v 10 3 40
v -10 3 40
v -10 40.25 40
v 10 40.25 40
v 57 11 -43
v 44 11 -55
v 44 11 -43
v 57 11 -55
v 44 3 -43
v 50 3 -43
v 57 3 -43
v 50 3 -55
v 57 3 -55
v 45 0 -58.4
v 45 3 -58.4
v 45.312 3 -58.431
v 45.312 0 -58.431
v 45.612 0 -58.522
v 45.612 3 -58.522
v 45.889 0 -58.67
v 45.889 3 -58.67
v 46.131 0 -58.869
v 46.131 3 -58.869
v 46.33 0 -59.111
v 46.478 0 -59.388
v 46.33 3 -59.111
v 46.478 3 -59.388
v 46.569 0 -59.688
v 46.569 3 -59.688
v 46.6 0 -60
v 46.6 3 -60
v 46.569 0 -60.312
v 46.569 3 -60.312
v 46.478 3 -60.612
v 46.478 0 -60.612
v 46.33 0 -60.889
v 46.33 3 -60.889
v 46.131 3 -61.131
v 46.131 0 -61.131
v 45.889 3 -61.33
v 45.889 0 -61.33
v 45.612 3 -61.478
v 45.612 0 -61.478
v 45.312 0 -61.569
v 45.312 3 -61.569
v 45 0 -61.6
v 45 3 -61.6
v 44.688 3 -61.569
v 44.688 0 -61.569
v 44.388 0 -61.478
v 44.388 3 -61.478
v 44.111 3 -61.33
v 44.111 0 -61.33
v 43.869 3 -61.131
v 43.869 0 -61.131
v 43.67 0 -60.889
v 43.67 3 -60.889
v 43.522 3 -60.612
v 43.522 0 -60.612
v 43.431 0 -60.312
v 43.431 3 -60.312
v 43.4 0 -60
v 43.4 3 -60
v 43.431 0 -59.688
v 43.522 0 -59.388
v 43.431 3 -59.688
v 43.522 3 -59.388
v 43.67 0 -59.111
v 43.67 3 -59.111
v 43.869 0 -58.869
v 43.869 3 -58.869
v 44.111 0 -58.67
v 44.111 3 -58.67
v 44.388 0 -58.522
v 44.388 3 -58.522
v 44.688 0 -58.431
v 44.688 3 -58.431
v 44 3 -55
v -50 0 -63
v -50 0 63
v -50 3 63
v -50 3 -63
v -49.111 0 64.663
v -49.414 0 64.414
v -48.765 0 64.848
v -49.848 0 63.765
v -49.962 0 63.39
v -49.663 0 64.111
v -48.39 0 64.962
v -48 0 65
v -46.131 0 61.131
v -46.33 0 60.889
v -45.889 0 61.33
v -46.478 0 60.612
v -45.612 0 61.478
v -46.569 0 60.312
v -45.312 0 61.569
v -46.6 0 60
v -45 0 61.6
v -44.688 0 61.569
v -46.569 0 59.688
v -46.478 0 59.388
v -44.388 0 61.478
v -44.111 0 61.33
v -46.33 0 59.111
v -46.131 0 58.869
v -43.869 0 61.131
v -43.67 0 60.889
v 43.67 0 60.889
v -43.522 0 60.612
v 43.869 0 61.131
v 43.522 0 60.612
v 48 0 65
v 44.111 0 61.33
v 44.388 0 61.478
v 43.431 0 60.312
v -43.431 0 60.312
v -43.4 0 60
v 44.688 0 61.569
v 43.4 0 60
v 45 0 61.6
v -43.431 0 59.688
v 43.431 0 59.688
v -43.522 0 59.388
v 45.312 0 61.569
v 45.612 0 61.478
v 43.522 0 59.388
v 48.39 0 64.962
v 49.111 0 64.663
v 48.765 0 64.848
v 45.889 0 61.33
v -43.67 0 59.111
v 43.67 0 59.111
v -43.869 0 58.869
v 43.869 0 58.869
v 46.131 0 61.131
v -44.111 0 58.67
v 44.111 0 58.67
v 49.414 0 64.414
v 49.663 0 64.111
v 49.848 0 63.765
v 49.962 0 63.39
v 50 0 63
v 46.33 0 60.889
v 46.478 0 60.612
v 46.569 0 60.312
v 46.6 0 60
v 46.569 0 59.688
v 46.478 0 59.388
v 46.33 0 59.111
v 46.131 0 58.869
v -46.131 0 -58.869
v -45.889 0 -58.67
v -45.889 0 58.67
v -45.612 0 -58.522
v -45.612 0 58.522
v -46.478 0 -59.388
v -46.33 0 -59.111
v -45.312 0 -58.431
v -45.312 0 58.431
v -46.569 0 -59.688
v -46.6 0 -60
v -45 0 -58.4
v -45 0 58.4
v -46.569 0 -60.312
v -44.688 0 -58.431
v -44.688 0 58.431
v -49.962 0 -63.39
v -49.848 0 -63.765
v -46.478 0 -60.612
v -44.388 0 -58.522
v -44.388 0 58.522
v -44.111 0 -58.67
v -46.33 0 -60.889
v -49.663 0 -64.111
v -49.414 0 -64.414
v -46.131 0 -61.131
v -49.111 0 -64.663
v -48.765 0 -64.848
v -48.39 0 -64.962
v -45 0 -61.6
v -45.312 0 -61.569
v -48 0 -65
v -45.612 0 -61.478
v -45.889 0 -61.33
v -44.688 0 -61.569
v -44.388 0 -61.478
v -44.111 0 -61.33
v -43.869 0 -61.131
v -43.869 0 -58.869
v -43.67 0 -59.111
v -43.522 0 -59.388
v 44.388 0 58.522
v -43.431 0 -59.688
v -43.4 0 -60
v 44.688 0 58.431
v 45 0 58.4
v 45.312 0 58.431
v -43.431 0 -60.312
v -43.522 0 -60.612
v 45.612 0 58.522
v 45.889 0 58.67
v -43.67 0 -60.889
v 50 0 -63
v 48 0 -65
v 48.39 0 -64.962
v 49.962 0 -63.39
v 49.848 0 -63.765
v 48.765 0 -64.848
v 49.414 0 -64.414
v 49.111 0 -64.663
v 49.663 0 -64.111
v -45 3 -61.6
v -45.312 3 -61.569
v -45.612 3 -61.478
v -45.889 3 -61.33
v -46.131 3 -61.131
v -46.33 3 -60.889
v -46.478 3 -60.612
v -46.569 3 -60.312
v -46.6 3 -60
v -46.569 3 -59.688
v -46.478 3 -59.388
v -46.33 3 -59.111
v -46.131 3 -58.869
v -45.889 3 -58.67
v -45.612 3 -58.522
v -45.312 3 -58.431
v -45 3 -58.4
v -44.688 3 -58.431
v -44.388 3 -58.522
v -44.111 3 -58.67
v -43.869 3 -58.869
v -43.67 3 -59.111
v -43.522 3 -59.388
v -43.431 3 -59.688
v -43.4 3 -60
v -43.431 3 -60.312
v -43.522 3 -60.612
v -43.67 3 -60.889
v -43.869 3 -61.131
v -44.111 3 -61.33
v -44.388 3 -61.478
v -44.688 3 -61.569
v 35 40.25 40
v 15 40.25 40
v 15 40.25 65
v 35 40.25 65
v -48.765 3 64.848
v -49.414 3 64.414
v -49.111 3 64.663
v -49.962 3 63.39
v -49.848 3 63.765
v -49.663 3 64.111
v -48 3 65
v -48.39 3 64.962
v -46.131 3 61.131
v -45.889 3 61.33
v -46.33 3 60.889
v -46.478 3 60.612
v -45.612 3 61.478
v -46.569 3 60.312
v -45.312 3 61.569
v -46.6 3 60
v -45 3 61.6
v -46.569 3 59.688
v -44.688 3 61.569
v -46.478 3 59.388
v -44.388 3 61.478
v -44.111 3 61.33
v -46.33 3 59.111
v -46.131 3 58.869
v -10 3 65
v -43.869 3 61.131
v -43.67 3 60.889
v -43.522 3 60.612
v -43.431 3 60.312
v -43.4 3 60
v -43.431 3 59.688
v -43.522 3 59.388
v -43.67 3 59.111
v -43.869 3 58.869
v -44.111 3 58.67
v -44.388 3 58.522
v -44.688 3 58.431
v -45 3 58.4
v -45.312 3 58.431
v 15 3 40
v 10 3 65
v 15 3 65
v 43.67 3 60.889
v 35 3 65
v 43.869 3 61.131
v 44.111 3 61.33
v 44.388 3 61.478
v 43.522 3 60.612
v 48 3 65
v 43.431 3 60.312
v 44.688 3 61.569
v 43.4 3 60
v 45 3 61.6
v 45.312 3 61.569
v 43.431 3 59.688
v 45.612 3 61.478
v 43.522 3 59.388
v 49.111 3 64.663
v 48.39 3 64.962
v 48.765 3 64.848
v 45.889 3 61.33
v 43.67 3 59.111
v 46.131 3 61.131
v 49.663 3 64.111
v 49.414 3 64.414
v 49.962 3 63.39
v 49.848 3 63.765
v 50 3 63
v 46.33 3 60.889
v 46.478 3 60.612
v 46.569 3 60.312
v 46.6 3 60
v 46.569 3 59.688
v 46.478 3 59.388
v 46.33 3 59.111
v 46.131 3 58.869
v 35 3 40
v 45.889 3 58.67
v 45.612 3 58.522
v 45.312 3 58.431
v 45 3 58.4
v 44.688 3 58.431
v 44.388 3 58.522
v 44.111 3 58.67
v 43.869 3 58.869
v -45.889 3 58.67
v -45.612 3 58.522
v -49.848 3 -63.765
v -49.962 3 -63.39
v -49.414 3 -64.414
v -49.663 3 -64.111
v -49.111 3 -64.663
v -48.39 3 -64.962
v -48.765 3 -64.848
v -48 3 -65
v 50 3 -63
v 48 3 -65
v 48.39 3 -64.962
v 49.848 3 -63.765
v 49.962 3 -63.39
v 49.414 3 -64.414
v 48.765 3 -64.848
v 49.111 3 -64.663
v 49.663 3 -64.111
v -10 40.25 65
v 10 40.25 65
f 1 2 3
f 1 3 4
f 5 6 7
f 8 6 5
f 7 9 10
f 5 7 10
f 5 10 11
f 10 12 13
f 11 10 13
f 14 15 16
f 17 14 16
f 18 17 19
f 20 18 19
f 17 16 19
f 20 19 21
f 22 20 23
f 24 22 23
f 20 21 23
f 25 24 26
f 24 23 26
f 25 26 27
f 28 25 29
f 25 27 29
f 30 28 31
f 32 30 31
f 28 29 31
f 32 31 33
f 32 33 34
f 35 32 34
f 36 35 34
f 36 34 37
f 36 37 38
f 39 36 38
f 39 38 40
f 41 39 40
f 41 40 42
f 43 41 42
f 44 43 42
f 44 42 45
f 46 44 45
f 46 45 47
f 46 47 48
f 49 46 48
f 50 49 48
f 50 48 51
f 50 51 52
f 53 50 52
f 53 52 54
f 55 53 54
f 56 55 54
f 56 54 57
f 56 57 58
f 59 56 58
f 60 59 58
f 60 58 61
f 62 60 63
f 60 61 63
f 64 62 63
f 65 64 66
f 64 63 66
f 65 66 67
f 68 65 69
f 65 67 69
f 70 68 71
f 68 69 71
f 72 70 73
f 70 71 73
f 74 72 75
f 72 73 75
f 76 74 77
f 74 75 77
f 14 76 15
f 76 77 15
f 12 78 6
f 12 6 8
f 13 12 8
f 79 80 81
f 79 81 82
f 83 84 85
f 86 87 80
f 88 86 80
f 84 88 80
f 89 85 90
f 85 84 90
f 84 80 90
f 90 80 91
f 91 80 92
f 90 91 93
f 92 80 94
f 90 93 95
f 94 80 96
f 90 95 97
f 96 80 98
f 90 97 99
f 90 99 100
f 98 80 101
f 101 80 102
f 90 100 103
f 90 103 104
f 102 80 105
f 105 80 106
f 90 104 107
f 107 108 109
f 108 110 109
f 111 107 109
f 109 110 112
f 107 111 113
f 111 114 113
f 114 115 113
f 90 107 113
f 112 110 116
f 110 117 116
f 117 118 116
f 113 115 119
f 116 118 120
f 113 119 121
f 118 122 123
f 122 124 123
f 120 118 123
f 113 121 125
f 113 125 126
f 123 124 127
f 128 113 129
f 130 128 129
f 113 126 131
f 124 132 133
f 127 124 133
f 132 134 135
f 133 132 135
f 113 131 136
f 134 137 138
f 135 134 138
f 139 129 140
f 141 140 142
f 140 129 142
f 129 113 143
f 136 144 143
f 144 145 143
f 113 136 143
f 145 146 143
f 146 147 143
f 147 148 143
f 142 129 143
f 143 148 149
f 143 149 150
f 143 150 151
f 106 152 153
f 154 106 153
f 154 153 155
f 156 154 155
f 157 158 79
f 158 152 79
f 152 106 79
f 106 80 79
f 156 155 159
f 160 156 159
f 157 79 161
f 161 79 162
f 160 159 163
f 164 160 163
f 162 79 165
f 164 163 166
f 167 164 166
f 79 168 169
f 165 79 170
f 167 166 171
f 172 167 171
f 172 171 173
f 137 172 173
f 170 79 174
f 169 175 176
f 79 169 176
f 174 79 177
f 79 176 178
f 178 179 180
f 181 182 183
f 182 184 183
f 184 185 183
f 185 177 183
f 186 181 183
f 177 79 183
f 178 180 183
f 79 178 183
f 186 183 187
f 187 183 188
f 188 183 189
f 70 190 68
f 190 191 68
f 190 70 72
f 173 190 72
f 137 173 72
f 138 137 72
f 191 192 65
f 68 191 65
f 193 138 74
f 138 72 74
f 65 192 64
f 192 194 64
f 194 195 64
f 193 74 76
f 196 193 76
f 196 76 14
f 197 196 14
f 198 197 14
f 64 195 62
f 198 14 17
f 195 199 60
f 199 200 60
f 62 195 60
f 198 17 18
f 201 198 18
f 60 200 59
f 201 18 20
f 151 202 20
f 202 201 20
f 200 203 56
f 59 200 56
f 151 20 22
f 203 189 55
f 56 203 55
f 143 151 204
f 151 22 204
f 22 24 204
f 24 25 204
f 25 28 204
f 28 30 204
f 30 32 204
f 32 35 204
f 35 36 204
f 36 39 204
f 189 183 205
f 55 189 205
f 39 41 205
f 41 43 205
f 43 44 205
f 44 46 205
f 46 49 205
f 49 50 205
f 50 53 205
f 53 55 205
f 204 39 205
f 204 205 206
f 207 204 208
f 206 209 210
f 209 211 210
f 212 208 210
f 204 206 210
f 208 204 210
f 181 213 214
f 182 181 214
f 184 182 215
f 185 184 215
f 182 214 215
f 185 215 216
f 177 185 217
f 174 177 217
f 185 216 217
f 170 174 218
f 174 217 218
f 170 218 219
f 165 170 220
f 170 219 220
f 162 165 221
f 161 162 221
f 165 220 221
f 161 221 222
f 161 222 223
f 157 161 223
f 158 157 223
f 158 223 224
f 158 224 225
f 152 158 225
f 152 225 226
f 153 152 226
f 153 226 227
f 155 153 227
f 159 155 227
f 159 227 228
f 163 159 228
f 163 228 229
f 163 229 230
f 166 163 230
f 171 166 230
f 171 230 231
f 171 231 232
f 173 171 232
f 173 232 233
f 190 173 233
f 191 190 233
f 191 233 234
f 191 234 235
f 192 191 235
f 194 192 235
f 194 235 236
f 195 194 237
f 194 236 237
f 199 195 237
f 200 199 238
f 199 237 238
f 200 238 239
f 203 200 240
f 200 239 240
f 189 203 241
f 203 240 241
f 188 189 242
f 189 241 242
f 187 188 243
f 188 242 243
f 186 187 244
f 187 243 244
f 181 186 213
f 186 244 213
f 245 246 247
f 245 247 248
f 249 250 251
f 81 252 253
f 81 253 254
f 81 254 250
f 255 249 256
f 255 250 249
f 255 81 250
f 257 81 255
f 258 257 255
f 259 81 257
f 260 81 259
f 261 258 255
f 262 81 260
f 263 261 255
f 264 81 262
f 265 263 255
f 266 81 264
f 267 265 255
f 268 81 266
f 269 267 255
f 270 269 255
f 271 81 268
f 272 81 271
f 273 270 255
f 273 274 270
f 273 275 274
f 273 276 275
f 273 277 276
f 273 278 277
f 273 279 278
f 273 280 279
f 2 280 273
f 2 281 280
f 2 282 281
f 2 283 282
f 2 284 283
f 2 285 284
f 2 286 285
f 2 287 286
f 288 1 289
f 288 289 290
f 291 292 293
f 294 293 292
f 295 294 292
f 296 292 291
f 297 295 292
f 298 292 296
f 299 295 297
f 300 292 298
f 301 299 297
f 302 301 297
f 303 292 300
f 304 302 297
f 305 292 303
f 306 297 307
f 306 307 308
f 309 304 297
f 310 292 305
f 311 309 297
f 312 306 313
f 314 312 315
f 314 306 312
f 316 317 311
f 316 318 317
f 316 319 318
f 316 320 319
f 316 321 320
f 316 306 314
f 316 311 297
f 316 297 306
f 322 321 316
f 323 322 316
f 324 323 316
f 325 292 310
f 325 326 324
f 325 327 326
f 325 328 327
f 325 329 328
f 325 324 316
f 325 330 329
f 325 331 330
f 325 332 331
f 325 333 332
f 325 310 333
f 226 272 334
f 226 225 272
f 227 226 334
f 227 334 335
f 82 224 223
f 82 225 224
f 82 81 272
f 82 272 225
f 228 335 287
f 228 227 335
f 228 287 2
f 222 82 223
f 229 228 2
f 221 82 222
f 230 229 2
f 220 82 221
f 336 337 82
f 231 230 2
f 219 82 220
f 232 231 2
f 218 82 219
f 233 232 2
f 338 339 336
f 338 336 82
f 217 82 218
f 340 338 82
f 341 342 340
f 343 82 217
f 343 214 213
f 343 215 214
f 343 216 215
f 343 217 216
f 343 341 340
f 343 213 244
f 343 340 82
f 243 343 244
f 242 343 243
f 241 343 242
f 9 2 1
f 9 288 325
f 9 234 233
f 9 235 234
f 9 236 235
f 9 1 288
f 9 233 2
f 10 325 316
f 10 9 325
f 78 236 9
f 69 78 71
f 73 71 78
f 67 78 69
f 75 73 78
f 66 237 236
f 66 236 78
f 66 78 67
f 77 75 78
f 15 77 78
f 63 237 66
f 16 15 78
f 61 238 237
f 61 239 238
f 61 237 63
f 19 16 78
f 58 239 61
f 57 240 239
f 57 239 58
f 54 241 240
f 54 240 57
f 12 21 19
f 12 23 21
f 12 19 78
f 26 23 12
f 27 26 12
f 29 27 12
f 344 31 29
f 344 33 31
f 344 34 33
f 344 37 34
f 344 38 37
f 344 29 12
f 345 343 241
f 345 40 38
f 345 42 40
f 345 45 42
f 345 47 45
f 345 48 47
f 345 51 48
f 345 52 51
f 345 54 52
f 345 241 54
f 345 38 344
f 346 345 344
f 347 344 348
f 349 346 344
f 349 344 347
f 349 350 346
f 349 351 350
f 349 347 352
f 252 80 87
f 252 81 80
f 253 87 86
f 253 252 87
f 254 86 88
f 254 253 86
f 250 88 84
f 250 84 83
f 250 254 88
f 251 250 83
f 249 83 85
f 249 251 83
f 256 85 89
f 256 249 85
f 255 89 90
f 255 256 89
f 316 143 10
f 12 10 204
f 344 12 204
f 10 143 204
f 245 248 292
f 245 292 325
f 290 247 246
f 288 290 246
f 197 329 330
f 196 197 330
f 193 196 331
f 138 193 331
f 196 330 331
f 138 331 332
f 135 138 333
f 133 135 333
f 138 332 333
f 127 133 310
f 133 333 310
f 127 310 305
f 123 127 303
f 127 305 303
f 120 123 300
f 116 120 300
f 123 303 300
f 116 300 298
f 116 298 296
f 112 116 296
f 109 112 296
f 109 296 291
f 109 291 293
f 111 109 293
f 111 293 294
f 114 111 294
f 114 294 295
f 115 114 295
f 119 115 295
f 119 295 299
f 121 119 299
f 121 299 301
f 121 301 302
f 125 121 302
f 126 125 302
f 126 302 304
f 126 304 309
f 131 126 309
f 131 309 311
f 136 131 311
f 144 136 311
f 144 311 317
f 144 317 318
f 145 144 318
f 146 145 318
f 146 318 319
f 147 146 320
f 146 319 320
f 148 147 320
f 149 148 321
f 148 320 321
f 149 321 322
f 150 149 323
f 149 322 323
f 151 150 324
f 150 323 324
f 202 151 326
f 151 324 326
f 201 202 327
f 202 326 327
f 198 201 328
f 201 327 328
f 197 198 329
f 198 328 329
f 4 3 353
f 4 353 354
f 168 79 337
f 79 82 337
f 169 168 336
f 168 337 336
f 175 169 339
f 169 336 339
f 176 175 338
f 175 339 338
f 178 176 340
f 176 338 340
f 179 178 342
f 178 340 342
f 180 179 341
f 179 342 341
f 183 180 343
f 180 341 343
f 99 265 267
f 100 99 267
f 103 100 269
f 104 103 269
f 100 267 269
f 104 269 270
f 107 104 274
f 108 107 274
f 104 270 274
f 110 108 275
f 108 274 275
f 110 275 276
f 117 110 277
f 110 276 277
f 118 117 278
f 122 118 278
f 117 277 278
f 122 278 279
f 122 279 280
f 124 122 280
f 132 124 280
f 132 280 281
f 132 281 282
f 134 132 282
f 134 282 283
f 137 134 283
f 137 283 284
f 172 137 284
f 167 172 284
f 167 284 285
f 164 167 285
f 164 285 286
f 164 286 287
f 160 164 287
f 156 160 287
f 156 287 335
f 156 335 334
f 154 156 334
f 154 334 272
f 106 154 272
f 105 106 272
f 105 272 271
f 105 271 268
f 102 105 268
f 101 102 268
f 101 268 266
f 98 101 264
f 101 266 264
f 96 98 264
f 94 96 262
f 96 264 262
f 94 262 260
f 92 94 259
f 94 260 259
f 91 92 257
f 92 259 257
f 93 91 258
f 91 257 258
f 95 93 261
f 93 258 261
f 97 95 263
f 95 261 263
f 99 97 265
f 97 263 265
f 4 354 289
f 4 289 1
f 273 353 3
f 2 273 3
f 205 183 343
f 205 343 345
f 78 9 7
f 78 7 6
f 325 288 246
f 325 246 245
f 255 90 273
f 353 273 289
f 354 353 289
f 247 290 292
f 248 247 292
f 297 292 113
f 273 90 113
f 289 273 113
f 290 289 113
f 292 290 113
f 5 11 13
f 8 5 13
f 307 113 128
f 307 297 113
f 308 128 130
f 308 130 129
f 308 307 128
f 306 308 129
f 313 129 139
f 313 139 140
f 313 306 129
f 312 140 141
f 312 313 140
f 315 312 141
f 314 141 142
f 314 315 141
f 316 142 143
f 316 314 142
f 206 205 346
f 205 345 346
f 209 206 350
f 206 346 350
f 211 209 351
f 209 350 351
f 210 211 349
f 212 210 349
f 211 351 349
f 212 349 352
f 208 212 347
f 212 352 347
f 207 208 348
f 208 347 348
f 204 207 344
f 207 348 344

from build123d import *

# Parameters (mm, degrees)
SKETCH_1_W          = 100
SKETCH_1_H          = 130
EXTRUDE_1_DEPTH     = 3
SKETCH_2_W          = 20
SKETCH_2_H          = 25
EXTRUDE_2_DEPTH     = 37.25
FILLET_1_R          = 2
SKETCH_3_W          = 13
SKETCH_3_H          = 12
EXTRUDE_3_DEPTH     = 8
SKETCH_4_R          = 1.6
CUT_EXTRUDE_1_DEPTH = 95.135872546


with BuildPart() as part:
    # 草图1 → 凸台-拉伸1 (new body)
    with BuildSketch(Plane(origin=(0, 0, 0), x_dir=(1, 0, 0), z_dir=(0, 1, 0))):
        Rectangle(SKETCH_1_W, SKETCH_1_H)
    extrude(amount=EXTRUDE_1_DEPTH)

    # 草图2 → 凸台-拉伸2 (add)
    with BuildSketch(Plane(origin=(0, 3, 0), x_dir=(1, 0, 0), z_dir=(0, 1, 0))):
        with Locations((0, -52.5)):
            Rectangle(SKETCH_2_W, SKETCH_2_H)
        with Locations((25, -52.5)):
            Rectangle(SKETCH_2_W, SKETCH_2_H)
    extrude(amount=EXTRUDE_2_DEPTH)

    # 圆角1
    fillet_1_edges = [part.edges().sort_by_distance(p)[0] for p in [
        (-50, 1.5, 65),
        (-50, 1.5, -65),
        (50, 1.5, -65),
        (50, 1.5, 65),
    ]]
    fillet(fillet_1_edges, radius=FILLET_1_R)

    # 草图3 → 凸台-拉伸3 (add)
    with BuildSketch(Plane(origin=(0, 3, 0), x_dir=(1, 0, 0), z_dir=(0, 1, 0))):
        with Locations((50.5, 49)):
            Rectangle(SKETCH_3_W, SKETCH_3_H)
    extrude(amount=EXTRUDE_3_DEPTH)

    # 草图4 → 切除-拉伸1 (cut, through all)
    with BuildSketch(Plane(origin=(0, 3, 0), x_dir=(1, 0, 0), z_dir=(0, 1, 0))):
        with Locations(Location((-45, -60, 0), (0, 0, 270))):
            Circle(SKETCH_4_R)
        with Locations(Location((-45, 60, 0), (0, 0, 90))):
            Circle(SKETCH_4_R)
        with Locations(Location((45, 60, 0), (0, 0, 270))):
            Circle(SKETCH_4_R)
        with Locations(Location((45, -60, 0), (0, 0, 90))):
            Circle(SKETCH_4_R)
    extrude(amount=-CUT_EXTRUDE_1_DEPTH, mode=Mode.SUBTRACT)


solid = part.part
